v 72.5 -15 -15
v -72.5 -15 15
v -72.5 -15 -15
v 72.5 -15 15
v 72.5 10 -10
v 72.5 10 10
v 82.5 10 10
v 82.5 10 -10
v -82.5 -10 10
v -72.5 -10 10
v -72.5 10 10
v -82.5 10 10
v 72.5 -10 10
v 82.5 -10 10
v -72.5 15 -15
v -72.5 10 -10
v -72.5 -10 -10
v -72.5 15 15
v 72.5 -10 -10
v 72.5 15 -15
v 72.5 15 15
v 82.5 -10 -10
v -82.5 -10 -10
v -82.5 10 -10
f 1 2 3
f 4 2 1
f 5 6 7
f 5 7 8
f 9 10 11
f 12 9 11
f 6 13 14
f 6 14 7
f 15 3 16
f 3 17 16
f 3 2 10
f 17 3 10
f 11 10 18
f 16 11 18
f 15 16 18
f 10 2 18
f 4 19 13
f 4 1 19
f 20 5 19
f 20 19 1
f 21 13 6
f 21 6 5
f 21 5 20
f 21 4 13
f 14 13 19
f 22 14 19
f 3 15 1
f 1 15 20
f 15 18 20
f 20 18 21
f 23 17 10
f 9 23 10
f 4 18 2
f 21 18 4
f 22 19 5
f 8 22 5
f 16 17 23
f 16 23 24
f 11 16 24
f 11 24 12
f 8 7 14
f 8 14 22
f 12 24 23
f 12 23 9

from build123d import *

# Parameters (mm, degrees)
SKETCH1_W           = 145
SKETCH1_H           = 30
BOSS_EXTRUDE1_DEPTH = 15
SKETCH2_W           = 20
SKETCH2_H           = 20
BOSS_EXTRUDE2_DEPTH = 10
SKETCH3_W           = 20
SKETCH3_H           = 20
BOSS_EXTRUDE3_DEPTH = 10


with BuildPart() as part:
    # Sketch1 → Boss-Extrude1 (new, symmetric)
    with BuildSketch(Plane.XY):
        Rectangle(SKETCH1_W, SKETCH1_H)
    extrude(amount=BOSS_EXTRUDE1_DEPTH, both=True)

    # Sketch2 → Boss-Extrude2 (add)
    with BuildSketch(Plane(origin=(72.5, 0, 0), x_dir=(0, 0, -1), z_dir=(1, 0, 0))):
        Rectangle(SKETCH2_W, SKETCH2_H)
    extrude(amount=BOSS_EXTRUDE2_DEPTH)

    # Sketch3 → Boss-Extrude3 (add)
    with BuildSketch(Plane.ZY.offset(72.5)):
        Rectangle(SKETCH3_W, SKETCH3_H)
    extrude(amount=BOSS_EXTRUDE3_DEPTH)


solid = part.part
